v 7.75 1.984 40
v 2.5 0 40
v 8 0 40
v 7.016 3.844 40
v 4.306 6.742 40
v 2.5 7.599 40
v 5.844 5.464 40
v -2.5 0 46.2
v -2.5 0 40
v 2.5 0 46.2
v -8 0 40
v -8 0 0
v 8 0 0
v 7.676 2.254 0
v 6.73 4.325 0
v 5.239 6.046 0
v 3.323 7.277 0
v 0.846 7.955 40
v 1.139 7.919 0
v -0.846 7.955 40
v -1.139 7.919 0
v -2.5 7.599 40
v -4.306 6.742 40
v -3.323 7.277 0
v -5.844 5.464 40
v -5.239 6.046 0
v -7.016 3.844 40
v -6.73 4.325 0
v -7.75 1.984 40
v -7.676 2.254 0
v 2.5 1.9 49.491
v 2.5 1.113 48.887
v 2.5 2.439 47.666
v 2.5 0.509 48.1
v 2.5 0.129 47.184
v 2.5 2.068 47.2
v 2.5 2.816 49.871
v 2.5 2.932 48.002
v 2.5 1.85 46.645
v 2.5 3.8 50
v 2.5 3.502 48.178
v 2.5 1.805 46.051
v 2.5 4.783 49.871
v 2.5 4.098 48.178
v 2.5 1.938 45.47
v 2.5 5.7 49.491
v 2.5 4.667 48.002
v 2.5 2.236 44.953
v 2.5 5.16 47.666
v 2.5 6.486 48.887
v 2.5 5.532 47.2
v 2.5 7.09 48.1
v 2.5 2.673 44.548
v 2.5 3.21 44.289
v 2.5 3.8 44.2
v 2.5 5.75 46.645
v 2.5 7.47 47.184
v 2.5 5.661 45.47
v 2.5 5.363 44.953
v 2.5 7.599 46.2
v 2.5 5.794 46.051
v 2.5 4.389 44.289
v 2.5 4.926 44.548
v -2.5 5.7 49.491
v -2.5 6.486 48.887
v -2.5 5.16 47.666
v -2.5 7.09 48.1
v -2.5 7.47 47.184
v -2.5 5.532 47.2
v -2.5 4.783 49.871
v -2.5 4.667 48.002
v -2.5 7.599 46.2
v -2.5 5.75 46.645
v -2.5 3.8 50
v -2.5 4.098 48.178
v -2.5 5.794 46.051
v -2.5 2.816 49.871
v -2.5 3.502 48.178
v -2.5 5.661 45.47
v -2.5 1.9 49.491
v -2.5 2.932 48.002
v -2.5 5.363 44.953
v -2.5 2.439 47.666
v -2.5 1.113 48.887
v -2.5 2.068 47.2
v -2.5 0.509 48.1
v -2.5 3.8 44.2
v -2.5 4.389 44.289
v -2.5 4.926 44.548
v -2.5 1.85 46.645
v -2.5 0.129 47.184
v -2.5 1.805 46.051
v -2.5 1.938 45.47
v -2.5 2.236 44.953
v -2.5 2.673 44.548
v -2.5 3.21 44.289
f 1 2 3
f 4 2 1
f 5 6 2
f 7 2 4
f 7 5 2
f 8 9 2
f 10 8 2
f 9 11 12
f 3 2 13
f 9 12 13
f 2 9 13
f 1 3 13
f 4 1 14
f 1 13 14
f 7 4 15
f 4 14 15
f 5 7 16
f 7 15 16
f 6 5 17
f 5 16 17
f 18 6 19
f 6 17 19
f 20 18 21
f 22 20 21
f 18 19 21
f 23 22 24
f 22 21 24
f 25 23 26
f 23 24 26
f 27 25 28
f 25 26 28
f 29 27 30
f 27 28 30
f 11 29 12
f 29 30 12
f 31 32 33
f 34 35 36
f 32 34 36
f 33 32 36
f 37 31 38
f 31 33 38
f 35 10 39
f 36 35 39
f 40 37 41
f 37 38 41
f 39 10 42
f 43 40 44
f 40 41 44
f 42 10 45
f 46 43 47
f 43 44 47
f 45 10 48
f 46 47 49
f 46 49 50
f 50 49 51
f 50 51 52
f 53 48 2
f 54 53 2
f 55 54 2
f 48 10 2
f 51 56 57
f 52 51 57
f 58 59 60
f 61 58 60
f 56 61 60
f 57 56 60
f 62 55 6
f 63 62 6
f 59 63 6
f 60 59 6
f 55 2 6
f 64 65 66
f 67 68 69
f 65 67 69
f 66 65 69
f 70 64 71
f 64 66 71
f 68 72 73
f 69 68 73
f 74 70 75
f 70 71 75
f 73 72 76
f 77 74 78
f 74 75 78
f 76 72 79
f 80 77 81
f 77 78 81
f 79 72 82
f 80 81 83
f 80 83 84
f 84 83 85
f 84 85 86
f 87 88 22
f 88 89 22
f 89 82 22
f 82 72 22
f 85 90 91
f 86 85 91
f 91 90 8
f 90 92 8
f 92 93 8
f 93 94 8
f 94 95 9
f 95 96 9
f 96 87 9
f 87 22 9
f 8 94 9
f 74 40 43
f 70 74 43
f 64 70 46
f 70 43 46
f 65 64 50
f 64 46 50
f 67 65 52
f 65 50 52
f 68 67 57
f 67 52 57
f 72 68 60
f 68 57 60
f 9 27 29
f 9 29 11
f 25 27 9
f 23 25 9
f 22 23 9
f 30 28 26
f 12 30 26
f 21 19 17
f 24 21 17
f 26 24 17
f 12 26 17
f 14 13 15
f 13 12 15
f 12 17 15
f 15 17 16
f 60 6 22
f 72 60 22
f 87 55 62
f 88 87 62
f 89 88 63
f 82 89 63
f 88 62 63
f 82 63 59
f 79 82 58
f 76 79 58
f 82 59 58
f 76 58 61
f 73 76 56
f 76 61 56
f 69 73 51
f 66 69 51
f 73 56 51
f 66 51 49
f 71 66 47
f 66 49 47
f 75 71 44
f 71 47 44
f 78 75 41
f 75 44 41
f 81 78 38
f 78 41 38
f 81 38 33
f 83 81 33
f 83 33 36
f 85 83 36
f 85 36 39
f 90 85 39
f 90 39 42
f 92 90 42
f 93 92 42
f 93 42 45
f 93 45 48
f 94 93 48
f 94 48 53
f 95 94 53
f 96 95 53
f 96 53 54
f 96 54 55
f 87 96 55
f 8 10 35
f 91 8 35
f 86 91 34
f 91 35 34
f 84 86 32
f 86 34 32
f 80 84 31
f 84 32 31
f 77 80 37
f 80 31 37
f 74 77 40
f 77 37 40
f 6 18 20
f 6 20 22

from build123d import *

# Parameters (mm, degrees)
EXTRUDE_1_DEPTH     = 40
EXTRUDE_2_DEPTH     = 10
CUT_EXTRUDE_1_REACH = 53.713
CUT_EXTRUDE_2_REACH = 53.713


with BuildPart() as part:
    # 스케치1 → 보스-돌출1 (new body)
    with BuildSketch(Plane.XY):
        with BuildLine():
            ThreePointArc((8, 0), (0, 8), (-8, 0))
            Line((-8, 0), (-4, 0))
            ThreePointArc((-4, 0), (0, 4), (4, 0))
            Line((4, 0), (8, 0))
        make_face()
        with BuildLine():
            ThreePointArc((4, 0), (0, 4), (-4, 0))
            Line((-4, 0), (4, 0))
        make_face()
    extrude(amount=EXTRUDE_1_DEPTH)

    # 스케치6 → 보스-돌출2 (add)
    with BuildSketch(Plane.XY.offset(40)):
        Polygon((0, 0), (2.5, 0), (2.5, 7.599342077), (-2.5, 7.599342077), (-2.5, 0), align=None)
    extrude(amount=EXTRUDE_2_DEPTH)

    # 스케치8 → 컷-돌출1 (cut, up to next)
    with BuildSketch(Plane(origin=(2.5, 0, 0), x_dir=(0, 0, -1), z_dir=(1, 0, 0)), mode=Mode.PRIVATE) as cut_extrude_1_sk1:
        with BuildLine():
            Line((-50, 7.599342077), (-50, 3.799671038))
            ThreePointArc((-50, 3.799671038), (-48.887102119, 6.486444196), (-46.200328962, 7.599342077))
            Line((-46.200328962, 7.599342077), (-50, 7.599342077))
        make_face()
    cut_extrude_1_tool1 = extrude(cut_extrude_1_sk1.sketch, amount=-CUT_EXTRUDE_1_REACH, mode=Mode.PRIVATE) & part.part
    # 스케치8 → 컷-돌출1 (cut, up to next)
    with BuildSketch(Plane(origin=(2.5, 0, 0), x_dir=(0, 0, -1), z_dir=(1, 0, 0)), mode=Mode.PRIVATE) as cut_extrude_1_sk2:
        with BuildLine():
            ThreePointArc((-46.200328962, 0), (-48.887102119, 1.112897881), (-50, 3.799671038))
            Line((-50, 3.799671038), (-50, 0))
            Line((-50, 0), (-46.200328962, 0))
        make_face()
    cut_extrude_1_tool2 = extrude(cut_extrude_1_sk2.sketch, amount=-CUT_EXTRUDE_1_REACH, mode=Mode.PRIVATE) & part.part
    add(cut_extrude_1_tool1.solids().sort_by_distance((2.5, 6.750617, 49.151275))[0], mode=Mode.SUBTRACT)
    add(cut_extrude_1_tool2.solids().sort_by_distance((2.5, 0.848725, 49.151275))[0], mode=Mode.SUBTRACT)

    # 스케치8<4> → 컷-돌출2 (cut, up to next)
    with BuildSketch(Plane(origin=(2.5, 0, 0), x_dir=(0, 0, -1), z_dir=(1, 0, 0)), mode=Mode.PRIVATE) as cut_extrude_2_sk1:
        with BuildLine():
            ThreePointArc((-48.200328962, 3.799671038), (-46.200328962, 1.799671038), (-44.200328962, 3.799671038))
            Line((-44.200328962, 3.799671038), (-48.200328962, 3.799671038))
        make_face()
    cut_extrude_2_tool1 = extrude(cut_extrude_2_sk1.sketch, amount=-CUT_EXTRUDE_2_REACH, mode=Mode.PRIVATE) & part.part
    # 스케치8<4> → 컷-돌출2 (cut, up to next)
    with BuildSketch(Plane(origin=(2.5, 0, 0), x_dir=(0, 0, -1), z_dir=(1, 0, 0)), mode=Mode.PRIVATE) as cut_extrude_2_sk2:
        with BuildLine():
            Line((-48.200328962, 3.799671038), (-44.200328962, 3.799671038))
            ThreePointArc((-44.200328962, 3.799671038), (-46.200328962, 5.799671038), (-48.200328962, 3.799671038))
        make_face()
    cut_extrude_2_tool2 = extrude(cut_extrude_2_sk2.sketch, amount=-CUT_EXTRUDE_2_REACH, mode=Mode.PRIVATE) & part.part
    # 스케치8<4> → 컷-돌출2 (cut, up to next)
    with BuildSketch(Plane(origin=(2.5, 0, 0), x_dir=(0, 0, -1), z_dir=(1, 0, 0)), mode=Mode.PRIVATE) as cut_extrude_2_sk3:
        with BuildLine():
            ThreePointArc((-48.200328962, 3.799671038), (-46.200328962, 1.799671038), (-44.200328962, 3.799671038))
            Line((-44.200328962, 3.799671038), (-48.200328962, 3.799671038))
        make_face()
    cut_extrude_2_tool3 = extrude(cut_extrude_2_sk3.sketch, amount=-CUT_EXTRUDE_2_REACH, mode=Mode.PRIVATE) & part.part
    # 스케치8<4> → 컷-돌출2 (cut, up to next)
    with BuildSketch(Plane(origin=(2.5, 0, 0), x_dir=(0, 0, -1), z_dir=(1, 0, 0)), mode=Mode.PRIVATE) as cut_extrude_2_sk4:
        with BuildLine():
            Line((-48.200328962, 3.799671038), (-44.200328962, 3.799671038))
            ThreePointArc((-44.200328962, 3.799671038), (-46.200328962, 5.799671038), (-48.200328962, 3.799671038))
        make_face()
    cut_extrude_2_tool4 = extrude(cut_extrude_2_sk4.sketch, amount=-CUT_EXTRUDE_2_REACH, mode=Mode.PRIVATE) & part.part
    add(cut_extrude_2_tool1.solids().sort_by_distance((2.5, 2.950845, 46.200329))[0], mode=Mode.SUBTRACT)
    add(cut_extrude_2_tool2.solids().sort_by_distance((2.5, 4.648497, 46.200329))[0], mode=Mode.SUBTRACT)
    add(cut_extrude_2_tool3.solids().sort_by_distance((2.5, 2.950845, 46.200329))[0], mode=Mode.SUBTRACT)
    add(cut_extrude_2_tool4.solids().sort_by_distance((2.5, 4.648497, 46.200329))[0], mode=Mode.SUBTRACT)


solid = part.part
